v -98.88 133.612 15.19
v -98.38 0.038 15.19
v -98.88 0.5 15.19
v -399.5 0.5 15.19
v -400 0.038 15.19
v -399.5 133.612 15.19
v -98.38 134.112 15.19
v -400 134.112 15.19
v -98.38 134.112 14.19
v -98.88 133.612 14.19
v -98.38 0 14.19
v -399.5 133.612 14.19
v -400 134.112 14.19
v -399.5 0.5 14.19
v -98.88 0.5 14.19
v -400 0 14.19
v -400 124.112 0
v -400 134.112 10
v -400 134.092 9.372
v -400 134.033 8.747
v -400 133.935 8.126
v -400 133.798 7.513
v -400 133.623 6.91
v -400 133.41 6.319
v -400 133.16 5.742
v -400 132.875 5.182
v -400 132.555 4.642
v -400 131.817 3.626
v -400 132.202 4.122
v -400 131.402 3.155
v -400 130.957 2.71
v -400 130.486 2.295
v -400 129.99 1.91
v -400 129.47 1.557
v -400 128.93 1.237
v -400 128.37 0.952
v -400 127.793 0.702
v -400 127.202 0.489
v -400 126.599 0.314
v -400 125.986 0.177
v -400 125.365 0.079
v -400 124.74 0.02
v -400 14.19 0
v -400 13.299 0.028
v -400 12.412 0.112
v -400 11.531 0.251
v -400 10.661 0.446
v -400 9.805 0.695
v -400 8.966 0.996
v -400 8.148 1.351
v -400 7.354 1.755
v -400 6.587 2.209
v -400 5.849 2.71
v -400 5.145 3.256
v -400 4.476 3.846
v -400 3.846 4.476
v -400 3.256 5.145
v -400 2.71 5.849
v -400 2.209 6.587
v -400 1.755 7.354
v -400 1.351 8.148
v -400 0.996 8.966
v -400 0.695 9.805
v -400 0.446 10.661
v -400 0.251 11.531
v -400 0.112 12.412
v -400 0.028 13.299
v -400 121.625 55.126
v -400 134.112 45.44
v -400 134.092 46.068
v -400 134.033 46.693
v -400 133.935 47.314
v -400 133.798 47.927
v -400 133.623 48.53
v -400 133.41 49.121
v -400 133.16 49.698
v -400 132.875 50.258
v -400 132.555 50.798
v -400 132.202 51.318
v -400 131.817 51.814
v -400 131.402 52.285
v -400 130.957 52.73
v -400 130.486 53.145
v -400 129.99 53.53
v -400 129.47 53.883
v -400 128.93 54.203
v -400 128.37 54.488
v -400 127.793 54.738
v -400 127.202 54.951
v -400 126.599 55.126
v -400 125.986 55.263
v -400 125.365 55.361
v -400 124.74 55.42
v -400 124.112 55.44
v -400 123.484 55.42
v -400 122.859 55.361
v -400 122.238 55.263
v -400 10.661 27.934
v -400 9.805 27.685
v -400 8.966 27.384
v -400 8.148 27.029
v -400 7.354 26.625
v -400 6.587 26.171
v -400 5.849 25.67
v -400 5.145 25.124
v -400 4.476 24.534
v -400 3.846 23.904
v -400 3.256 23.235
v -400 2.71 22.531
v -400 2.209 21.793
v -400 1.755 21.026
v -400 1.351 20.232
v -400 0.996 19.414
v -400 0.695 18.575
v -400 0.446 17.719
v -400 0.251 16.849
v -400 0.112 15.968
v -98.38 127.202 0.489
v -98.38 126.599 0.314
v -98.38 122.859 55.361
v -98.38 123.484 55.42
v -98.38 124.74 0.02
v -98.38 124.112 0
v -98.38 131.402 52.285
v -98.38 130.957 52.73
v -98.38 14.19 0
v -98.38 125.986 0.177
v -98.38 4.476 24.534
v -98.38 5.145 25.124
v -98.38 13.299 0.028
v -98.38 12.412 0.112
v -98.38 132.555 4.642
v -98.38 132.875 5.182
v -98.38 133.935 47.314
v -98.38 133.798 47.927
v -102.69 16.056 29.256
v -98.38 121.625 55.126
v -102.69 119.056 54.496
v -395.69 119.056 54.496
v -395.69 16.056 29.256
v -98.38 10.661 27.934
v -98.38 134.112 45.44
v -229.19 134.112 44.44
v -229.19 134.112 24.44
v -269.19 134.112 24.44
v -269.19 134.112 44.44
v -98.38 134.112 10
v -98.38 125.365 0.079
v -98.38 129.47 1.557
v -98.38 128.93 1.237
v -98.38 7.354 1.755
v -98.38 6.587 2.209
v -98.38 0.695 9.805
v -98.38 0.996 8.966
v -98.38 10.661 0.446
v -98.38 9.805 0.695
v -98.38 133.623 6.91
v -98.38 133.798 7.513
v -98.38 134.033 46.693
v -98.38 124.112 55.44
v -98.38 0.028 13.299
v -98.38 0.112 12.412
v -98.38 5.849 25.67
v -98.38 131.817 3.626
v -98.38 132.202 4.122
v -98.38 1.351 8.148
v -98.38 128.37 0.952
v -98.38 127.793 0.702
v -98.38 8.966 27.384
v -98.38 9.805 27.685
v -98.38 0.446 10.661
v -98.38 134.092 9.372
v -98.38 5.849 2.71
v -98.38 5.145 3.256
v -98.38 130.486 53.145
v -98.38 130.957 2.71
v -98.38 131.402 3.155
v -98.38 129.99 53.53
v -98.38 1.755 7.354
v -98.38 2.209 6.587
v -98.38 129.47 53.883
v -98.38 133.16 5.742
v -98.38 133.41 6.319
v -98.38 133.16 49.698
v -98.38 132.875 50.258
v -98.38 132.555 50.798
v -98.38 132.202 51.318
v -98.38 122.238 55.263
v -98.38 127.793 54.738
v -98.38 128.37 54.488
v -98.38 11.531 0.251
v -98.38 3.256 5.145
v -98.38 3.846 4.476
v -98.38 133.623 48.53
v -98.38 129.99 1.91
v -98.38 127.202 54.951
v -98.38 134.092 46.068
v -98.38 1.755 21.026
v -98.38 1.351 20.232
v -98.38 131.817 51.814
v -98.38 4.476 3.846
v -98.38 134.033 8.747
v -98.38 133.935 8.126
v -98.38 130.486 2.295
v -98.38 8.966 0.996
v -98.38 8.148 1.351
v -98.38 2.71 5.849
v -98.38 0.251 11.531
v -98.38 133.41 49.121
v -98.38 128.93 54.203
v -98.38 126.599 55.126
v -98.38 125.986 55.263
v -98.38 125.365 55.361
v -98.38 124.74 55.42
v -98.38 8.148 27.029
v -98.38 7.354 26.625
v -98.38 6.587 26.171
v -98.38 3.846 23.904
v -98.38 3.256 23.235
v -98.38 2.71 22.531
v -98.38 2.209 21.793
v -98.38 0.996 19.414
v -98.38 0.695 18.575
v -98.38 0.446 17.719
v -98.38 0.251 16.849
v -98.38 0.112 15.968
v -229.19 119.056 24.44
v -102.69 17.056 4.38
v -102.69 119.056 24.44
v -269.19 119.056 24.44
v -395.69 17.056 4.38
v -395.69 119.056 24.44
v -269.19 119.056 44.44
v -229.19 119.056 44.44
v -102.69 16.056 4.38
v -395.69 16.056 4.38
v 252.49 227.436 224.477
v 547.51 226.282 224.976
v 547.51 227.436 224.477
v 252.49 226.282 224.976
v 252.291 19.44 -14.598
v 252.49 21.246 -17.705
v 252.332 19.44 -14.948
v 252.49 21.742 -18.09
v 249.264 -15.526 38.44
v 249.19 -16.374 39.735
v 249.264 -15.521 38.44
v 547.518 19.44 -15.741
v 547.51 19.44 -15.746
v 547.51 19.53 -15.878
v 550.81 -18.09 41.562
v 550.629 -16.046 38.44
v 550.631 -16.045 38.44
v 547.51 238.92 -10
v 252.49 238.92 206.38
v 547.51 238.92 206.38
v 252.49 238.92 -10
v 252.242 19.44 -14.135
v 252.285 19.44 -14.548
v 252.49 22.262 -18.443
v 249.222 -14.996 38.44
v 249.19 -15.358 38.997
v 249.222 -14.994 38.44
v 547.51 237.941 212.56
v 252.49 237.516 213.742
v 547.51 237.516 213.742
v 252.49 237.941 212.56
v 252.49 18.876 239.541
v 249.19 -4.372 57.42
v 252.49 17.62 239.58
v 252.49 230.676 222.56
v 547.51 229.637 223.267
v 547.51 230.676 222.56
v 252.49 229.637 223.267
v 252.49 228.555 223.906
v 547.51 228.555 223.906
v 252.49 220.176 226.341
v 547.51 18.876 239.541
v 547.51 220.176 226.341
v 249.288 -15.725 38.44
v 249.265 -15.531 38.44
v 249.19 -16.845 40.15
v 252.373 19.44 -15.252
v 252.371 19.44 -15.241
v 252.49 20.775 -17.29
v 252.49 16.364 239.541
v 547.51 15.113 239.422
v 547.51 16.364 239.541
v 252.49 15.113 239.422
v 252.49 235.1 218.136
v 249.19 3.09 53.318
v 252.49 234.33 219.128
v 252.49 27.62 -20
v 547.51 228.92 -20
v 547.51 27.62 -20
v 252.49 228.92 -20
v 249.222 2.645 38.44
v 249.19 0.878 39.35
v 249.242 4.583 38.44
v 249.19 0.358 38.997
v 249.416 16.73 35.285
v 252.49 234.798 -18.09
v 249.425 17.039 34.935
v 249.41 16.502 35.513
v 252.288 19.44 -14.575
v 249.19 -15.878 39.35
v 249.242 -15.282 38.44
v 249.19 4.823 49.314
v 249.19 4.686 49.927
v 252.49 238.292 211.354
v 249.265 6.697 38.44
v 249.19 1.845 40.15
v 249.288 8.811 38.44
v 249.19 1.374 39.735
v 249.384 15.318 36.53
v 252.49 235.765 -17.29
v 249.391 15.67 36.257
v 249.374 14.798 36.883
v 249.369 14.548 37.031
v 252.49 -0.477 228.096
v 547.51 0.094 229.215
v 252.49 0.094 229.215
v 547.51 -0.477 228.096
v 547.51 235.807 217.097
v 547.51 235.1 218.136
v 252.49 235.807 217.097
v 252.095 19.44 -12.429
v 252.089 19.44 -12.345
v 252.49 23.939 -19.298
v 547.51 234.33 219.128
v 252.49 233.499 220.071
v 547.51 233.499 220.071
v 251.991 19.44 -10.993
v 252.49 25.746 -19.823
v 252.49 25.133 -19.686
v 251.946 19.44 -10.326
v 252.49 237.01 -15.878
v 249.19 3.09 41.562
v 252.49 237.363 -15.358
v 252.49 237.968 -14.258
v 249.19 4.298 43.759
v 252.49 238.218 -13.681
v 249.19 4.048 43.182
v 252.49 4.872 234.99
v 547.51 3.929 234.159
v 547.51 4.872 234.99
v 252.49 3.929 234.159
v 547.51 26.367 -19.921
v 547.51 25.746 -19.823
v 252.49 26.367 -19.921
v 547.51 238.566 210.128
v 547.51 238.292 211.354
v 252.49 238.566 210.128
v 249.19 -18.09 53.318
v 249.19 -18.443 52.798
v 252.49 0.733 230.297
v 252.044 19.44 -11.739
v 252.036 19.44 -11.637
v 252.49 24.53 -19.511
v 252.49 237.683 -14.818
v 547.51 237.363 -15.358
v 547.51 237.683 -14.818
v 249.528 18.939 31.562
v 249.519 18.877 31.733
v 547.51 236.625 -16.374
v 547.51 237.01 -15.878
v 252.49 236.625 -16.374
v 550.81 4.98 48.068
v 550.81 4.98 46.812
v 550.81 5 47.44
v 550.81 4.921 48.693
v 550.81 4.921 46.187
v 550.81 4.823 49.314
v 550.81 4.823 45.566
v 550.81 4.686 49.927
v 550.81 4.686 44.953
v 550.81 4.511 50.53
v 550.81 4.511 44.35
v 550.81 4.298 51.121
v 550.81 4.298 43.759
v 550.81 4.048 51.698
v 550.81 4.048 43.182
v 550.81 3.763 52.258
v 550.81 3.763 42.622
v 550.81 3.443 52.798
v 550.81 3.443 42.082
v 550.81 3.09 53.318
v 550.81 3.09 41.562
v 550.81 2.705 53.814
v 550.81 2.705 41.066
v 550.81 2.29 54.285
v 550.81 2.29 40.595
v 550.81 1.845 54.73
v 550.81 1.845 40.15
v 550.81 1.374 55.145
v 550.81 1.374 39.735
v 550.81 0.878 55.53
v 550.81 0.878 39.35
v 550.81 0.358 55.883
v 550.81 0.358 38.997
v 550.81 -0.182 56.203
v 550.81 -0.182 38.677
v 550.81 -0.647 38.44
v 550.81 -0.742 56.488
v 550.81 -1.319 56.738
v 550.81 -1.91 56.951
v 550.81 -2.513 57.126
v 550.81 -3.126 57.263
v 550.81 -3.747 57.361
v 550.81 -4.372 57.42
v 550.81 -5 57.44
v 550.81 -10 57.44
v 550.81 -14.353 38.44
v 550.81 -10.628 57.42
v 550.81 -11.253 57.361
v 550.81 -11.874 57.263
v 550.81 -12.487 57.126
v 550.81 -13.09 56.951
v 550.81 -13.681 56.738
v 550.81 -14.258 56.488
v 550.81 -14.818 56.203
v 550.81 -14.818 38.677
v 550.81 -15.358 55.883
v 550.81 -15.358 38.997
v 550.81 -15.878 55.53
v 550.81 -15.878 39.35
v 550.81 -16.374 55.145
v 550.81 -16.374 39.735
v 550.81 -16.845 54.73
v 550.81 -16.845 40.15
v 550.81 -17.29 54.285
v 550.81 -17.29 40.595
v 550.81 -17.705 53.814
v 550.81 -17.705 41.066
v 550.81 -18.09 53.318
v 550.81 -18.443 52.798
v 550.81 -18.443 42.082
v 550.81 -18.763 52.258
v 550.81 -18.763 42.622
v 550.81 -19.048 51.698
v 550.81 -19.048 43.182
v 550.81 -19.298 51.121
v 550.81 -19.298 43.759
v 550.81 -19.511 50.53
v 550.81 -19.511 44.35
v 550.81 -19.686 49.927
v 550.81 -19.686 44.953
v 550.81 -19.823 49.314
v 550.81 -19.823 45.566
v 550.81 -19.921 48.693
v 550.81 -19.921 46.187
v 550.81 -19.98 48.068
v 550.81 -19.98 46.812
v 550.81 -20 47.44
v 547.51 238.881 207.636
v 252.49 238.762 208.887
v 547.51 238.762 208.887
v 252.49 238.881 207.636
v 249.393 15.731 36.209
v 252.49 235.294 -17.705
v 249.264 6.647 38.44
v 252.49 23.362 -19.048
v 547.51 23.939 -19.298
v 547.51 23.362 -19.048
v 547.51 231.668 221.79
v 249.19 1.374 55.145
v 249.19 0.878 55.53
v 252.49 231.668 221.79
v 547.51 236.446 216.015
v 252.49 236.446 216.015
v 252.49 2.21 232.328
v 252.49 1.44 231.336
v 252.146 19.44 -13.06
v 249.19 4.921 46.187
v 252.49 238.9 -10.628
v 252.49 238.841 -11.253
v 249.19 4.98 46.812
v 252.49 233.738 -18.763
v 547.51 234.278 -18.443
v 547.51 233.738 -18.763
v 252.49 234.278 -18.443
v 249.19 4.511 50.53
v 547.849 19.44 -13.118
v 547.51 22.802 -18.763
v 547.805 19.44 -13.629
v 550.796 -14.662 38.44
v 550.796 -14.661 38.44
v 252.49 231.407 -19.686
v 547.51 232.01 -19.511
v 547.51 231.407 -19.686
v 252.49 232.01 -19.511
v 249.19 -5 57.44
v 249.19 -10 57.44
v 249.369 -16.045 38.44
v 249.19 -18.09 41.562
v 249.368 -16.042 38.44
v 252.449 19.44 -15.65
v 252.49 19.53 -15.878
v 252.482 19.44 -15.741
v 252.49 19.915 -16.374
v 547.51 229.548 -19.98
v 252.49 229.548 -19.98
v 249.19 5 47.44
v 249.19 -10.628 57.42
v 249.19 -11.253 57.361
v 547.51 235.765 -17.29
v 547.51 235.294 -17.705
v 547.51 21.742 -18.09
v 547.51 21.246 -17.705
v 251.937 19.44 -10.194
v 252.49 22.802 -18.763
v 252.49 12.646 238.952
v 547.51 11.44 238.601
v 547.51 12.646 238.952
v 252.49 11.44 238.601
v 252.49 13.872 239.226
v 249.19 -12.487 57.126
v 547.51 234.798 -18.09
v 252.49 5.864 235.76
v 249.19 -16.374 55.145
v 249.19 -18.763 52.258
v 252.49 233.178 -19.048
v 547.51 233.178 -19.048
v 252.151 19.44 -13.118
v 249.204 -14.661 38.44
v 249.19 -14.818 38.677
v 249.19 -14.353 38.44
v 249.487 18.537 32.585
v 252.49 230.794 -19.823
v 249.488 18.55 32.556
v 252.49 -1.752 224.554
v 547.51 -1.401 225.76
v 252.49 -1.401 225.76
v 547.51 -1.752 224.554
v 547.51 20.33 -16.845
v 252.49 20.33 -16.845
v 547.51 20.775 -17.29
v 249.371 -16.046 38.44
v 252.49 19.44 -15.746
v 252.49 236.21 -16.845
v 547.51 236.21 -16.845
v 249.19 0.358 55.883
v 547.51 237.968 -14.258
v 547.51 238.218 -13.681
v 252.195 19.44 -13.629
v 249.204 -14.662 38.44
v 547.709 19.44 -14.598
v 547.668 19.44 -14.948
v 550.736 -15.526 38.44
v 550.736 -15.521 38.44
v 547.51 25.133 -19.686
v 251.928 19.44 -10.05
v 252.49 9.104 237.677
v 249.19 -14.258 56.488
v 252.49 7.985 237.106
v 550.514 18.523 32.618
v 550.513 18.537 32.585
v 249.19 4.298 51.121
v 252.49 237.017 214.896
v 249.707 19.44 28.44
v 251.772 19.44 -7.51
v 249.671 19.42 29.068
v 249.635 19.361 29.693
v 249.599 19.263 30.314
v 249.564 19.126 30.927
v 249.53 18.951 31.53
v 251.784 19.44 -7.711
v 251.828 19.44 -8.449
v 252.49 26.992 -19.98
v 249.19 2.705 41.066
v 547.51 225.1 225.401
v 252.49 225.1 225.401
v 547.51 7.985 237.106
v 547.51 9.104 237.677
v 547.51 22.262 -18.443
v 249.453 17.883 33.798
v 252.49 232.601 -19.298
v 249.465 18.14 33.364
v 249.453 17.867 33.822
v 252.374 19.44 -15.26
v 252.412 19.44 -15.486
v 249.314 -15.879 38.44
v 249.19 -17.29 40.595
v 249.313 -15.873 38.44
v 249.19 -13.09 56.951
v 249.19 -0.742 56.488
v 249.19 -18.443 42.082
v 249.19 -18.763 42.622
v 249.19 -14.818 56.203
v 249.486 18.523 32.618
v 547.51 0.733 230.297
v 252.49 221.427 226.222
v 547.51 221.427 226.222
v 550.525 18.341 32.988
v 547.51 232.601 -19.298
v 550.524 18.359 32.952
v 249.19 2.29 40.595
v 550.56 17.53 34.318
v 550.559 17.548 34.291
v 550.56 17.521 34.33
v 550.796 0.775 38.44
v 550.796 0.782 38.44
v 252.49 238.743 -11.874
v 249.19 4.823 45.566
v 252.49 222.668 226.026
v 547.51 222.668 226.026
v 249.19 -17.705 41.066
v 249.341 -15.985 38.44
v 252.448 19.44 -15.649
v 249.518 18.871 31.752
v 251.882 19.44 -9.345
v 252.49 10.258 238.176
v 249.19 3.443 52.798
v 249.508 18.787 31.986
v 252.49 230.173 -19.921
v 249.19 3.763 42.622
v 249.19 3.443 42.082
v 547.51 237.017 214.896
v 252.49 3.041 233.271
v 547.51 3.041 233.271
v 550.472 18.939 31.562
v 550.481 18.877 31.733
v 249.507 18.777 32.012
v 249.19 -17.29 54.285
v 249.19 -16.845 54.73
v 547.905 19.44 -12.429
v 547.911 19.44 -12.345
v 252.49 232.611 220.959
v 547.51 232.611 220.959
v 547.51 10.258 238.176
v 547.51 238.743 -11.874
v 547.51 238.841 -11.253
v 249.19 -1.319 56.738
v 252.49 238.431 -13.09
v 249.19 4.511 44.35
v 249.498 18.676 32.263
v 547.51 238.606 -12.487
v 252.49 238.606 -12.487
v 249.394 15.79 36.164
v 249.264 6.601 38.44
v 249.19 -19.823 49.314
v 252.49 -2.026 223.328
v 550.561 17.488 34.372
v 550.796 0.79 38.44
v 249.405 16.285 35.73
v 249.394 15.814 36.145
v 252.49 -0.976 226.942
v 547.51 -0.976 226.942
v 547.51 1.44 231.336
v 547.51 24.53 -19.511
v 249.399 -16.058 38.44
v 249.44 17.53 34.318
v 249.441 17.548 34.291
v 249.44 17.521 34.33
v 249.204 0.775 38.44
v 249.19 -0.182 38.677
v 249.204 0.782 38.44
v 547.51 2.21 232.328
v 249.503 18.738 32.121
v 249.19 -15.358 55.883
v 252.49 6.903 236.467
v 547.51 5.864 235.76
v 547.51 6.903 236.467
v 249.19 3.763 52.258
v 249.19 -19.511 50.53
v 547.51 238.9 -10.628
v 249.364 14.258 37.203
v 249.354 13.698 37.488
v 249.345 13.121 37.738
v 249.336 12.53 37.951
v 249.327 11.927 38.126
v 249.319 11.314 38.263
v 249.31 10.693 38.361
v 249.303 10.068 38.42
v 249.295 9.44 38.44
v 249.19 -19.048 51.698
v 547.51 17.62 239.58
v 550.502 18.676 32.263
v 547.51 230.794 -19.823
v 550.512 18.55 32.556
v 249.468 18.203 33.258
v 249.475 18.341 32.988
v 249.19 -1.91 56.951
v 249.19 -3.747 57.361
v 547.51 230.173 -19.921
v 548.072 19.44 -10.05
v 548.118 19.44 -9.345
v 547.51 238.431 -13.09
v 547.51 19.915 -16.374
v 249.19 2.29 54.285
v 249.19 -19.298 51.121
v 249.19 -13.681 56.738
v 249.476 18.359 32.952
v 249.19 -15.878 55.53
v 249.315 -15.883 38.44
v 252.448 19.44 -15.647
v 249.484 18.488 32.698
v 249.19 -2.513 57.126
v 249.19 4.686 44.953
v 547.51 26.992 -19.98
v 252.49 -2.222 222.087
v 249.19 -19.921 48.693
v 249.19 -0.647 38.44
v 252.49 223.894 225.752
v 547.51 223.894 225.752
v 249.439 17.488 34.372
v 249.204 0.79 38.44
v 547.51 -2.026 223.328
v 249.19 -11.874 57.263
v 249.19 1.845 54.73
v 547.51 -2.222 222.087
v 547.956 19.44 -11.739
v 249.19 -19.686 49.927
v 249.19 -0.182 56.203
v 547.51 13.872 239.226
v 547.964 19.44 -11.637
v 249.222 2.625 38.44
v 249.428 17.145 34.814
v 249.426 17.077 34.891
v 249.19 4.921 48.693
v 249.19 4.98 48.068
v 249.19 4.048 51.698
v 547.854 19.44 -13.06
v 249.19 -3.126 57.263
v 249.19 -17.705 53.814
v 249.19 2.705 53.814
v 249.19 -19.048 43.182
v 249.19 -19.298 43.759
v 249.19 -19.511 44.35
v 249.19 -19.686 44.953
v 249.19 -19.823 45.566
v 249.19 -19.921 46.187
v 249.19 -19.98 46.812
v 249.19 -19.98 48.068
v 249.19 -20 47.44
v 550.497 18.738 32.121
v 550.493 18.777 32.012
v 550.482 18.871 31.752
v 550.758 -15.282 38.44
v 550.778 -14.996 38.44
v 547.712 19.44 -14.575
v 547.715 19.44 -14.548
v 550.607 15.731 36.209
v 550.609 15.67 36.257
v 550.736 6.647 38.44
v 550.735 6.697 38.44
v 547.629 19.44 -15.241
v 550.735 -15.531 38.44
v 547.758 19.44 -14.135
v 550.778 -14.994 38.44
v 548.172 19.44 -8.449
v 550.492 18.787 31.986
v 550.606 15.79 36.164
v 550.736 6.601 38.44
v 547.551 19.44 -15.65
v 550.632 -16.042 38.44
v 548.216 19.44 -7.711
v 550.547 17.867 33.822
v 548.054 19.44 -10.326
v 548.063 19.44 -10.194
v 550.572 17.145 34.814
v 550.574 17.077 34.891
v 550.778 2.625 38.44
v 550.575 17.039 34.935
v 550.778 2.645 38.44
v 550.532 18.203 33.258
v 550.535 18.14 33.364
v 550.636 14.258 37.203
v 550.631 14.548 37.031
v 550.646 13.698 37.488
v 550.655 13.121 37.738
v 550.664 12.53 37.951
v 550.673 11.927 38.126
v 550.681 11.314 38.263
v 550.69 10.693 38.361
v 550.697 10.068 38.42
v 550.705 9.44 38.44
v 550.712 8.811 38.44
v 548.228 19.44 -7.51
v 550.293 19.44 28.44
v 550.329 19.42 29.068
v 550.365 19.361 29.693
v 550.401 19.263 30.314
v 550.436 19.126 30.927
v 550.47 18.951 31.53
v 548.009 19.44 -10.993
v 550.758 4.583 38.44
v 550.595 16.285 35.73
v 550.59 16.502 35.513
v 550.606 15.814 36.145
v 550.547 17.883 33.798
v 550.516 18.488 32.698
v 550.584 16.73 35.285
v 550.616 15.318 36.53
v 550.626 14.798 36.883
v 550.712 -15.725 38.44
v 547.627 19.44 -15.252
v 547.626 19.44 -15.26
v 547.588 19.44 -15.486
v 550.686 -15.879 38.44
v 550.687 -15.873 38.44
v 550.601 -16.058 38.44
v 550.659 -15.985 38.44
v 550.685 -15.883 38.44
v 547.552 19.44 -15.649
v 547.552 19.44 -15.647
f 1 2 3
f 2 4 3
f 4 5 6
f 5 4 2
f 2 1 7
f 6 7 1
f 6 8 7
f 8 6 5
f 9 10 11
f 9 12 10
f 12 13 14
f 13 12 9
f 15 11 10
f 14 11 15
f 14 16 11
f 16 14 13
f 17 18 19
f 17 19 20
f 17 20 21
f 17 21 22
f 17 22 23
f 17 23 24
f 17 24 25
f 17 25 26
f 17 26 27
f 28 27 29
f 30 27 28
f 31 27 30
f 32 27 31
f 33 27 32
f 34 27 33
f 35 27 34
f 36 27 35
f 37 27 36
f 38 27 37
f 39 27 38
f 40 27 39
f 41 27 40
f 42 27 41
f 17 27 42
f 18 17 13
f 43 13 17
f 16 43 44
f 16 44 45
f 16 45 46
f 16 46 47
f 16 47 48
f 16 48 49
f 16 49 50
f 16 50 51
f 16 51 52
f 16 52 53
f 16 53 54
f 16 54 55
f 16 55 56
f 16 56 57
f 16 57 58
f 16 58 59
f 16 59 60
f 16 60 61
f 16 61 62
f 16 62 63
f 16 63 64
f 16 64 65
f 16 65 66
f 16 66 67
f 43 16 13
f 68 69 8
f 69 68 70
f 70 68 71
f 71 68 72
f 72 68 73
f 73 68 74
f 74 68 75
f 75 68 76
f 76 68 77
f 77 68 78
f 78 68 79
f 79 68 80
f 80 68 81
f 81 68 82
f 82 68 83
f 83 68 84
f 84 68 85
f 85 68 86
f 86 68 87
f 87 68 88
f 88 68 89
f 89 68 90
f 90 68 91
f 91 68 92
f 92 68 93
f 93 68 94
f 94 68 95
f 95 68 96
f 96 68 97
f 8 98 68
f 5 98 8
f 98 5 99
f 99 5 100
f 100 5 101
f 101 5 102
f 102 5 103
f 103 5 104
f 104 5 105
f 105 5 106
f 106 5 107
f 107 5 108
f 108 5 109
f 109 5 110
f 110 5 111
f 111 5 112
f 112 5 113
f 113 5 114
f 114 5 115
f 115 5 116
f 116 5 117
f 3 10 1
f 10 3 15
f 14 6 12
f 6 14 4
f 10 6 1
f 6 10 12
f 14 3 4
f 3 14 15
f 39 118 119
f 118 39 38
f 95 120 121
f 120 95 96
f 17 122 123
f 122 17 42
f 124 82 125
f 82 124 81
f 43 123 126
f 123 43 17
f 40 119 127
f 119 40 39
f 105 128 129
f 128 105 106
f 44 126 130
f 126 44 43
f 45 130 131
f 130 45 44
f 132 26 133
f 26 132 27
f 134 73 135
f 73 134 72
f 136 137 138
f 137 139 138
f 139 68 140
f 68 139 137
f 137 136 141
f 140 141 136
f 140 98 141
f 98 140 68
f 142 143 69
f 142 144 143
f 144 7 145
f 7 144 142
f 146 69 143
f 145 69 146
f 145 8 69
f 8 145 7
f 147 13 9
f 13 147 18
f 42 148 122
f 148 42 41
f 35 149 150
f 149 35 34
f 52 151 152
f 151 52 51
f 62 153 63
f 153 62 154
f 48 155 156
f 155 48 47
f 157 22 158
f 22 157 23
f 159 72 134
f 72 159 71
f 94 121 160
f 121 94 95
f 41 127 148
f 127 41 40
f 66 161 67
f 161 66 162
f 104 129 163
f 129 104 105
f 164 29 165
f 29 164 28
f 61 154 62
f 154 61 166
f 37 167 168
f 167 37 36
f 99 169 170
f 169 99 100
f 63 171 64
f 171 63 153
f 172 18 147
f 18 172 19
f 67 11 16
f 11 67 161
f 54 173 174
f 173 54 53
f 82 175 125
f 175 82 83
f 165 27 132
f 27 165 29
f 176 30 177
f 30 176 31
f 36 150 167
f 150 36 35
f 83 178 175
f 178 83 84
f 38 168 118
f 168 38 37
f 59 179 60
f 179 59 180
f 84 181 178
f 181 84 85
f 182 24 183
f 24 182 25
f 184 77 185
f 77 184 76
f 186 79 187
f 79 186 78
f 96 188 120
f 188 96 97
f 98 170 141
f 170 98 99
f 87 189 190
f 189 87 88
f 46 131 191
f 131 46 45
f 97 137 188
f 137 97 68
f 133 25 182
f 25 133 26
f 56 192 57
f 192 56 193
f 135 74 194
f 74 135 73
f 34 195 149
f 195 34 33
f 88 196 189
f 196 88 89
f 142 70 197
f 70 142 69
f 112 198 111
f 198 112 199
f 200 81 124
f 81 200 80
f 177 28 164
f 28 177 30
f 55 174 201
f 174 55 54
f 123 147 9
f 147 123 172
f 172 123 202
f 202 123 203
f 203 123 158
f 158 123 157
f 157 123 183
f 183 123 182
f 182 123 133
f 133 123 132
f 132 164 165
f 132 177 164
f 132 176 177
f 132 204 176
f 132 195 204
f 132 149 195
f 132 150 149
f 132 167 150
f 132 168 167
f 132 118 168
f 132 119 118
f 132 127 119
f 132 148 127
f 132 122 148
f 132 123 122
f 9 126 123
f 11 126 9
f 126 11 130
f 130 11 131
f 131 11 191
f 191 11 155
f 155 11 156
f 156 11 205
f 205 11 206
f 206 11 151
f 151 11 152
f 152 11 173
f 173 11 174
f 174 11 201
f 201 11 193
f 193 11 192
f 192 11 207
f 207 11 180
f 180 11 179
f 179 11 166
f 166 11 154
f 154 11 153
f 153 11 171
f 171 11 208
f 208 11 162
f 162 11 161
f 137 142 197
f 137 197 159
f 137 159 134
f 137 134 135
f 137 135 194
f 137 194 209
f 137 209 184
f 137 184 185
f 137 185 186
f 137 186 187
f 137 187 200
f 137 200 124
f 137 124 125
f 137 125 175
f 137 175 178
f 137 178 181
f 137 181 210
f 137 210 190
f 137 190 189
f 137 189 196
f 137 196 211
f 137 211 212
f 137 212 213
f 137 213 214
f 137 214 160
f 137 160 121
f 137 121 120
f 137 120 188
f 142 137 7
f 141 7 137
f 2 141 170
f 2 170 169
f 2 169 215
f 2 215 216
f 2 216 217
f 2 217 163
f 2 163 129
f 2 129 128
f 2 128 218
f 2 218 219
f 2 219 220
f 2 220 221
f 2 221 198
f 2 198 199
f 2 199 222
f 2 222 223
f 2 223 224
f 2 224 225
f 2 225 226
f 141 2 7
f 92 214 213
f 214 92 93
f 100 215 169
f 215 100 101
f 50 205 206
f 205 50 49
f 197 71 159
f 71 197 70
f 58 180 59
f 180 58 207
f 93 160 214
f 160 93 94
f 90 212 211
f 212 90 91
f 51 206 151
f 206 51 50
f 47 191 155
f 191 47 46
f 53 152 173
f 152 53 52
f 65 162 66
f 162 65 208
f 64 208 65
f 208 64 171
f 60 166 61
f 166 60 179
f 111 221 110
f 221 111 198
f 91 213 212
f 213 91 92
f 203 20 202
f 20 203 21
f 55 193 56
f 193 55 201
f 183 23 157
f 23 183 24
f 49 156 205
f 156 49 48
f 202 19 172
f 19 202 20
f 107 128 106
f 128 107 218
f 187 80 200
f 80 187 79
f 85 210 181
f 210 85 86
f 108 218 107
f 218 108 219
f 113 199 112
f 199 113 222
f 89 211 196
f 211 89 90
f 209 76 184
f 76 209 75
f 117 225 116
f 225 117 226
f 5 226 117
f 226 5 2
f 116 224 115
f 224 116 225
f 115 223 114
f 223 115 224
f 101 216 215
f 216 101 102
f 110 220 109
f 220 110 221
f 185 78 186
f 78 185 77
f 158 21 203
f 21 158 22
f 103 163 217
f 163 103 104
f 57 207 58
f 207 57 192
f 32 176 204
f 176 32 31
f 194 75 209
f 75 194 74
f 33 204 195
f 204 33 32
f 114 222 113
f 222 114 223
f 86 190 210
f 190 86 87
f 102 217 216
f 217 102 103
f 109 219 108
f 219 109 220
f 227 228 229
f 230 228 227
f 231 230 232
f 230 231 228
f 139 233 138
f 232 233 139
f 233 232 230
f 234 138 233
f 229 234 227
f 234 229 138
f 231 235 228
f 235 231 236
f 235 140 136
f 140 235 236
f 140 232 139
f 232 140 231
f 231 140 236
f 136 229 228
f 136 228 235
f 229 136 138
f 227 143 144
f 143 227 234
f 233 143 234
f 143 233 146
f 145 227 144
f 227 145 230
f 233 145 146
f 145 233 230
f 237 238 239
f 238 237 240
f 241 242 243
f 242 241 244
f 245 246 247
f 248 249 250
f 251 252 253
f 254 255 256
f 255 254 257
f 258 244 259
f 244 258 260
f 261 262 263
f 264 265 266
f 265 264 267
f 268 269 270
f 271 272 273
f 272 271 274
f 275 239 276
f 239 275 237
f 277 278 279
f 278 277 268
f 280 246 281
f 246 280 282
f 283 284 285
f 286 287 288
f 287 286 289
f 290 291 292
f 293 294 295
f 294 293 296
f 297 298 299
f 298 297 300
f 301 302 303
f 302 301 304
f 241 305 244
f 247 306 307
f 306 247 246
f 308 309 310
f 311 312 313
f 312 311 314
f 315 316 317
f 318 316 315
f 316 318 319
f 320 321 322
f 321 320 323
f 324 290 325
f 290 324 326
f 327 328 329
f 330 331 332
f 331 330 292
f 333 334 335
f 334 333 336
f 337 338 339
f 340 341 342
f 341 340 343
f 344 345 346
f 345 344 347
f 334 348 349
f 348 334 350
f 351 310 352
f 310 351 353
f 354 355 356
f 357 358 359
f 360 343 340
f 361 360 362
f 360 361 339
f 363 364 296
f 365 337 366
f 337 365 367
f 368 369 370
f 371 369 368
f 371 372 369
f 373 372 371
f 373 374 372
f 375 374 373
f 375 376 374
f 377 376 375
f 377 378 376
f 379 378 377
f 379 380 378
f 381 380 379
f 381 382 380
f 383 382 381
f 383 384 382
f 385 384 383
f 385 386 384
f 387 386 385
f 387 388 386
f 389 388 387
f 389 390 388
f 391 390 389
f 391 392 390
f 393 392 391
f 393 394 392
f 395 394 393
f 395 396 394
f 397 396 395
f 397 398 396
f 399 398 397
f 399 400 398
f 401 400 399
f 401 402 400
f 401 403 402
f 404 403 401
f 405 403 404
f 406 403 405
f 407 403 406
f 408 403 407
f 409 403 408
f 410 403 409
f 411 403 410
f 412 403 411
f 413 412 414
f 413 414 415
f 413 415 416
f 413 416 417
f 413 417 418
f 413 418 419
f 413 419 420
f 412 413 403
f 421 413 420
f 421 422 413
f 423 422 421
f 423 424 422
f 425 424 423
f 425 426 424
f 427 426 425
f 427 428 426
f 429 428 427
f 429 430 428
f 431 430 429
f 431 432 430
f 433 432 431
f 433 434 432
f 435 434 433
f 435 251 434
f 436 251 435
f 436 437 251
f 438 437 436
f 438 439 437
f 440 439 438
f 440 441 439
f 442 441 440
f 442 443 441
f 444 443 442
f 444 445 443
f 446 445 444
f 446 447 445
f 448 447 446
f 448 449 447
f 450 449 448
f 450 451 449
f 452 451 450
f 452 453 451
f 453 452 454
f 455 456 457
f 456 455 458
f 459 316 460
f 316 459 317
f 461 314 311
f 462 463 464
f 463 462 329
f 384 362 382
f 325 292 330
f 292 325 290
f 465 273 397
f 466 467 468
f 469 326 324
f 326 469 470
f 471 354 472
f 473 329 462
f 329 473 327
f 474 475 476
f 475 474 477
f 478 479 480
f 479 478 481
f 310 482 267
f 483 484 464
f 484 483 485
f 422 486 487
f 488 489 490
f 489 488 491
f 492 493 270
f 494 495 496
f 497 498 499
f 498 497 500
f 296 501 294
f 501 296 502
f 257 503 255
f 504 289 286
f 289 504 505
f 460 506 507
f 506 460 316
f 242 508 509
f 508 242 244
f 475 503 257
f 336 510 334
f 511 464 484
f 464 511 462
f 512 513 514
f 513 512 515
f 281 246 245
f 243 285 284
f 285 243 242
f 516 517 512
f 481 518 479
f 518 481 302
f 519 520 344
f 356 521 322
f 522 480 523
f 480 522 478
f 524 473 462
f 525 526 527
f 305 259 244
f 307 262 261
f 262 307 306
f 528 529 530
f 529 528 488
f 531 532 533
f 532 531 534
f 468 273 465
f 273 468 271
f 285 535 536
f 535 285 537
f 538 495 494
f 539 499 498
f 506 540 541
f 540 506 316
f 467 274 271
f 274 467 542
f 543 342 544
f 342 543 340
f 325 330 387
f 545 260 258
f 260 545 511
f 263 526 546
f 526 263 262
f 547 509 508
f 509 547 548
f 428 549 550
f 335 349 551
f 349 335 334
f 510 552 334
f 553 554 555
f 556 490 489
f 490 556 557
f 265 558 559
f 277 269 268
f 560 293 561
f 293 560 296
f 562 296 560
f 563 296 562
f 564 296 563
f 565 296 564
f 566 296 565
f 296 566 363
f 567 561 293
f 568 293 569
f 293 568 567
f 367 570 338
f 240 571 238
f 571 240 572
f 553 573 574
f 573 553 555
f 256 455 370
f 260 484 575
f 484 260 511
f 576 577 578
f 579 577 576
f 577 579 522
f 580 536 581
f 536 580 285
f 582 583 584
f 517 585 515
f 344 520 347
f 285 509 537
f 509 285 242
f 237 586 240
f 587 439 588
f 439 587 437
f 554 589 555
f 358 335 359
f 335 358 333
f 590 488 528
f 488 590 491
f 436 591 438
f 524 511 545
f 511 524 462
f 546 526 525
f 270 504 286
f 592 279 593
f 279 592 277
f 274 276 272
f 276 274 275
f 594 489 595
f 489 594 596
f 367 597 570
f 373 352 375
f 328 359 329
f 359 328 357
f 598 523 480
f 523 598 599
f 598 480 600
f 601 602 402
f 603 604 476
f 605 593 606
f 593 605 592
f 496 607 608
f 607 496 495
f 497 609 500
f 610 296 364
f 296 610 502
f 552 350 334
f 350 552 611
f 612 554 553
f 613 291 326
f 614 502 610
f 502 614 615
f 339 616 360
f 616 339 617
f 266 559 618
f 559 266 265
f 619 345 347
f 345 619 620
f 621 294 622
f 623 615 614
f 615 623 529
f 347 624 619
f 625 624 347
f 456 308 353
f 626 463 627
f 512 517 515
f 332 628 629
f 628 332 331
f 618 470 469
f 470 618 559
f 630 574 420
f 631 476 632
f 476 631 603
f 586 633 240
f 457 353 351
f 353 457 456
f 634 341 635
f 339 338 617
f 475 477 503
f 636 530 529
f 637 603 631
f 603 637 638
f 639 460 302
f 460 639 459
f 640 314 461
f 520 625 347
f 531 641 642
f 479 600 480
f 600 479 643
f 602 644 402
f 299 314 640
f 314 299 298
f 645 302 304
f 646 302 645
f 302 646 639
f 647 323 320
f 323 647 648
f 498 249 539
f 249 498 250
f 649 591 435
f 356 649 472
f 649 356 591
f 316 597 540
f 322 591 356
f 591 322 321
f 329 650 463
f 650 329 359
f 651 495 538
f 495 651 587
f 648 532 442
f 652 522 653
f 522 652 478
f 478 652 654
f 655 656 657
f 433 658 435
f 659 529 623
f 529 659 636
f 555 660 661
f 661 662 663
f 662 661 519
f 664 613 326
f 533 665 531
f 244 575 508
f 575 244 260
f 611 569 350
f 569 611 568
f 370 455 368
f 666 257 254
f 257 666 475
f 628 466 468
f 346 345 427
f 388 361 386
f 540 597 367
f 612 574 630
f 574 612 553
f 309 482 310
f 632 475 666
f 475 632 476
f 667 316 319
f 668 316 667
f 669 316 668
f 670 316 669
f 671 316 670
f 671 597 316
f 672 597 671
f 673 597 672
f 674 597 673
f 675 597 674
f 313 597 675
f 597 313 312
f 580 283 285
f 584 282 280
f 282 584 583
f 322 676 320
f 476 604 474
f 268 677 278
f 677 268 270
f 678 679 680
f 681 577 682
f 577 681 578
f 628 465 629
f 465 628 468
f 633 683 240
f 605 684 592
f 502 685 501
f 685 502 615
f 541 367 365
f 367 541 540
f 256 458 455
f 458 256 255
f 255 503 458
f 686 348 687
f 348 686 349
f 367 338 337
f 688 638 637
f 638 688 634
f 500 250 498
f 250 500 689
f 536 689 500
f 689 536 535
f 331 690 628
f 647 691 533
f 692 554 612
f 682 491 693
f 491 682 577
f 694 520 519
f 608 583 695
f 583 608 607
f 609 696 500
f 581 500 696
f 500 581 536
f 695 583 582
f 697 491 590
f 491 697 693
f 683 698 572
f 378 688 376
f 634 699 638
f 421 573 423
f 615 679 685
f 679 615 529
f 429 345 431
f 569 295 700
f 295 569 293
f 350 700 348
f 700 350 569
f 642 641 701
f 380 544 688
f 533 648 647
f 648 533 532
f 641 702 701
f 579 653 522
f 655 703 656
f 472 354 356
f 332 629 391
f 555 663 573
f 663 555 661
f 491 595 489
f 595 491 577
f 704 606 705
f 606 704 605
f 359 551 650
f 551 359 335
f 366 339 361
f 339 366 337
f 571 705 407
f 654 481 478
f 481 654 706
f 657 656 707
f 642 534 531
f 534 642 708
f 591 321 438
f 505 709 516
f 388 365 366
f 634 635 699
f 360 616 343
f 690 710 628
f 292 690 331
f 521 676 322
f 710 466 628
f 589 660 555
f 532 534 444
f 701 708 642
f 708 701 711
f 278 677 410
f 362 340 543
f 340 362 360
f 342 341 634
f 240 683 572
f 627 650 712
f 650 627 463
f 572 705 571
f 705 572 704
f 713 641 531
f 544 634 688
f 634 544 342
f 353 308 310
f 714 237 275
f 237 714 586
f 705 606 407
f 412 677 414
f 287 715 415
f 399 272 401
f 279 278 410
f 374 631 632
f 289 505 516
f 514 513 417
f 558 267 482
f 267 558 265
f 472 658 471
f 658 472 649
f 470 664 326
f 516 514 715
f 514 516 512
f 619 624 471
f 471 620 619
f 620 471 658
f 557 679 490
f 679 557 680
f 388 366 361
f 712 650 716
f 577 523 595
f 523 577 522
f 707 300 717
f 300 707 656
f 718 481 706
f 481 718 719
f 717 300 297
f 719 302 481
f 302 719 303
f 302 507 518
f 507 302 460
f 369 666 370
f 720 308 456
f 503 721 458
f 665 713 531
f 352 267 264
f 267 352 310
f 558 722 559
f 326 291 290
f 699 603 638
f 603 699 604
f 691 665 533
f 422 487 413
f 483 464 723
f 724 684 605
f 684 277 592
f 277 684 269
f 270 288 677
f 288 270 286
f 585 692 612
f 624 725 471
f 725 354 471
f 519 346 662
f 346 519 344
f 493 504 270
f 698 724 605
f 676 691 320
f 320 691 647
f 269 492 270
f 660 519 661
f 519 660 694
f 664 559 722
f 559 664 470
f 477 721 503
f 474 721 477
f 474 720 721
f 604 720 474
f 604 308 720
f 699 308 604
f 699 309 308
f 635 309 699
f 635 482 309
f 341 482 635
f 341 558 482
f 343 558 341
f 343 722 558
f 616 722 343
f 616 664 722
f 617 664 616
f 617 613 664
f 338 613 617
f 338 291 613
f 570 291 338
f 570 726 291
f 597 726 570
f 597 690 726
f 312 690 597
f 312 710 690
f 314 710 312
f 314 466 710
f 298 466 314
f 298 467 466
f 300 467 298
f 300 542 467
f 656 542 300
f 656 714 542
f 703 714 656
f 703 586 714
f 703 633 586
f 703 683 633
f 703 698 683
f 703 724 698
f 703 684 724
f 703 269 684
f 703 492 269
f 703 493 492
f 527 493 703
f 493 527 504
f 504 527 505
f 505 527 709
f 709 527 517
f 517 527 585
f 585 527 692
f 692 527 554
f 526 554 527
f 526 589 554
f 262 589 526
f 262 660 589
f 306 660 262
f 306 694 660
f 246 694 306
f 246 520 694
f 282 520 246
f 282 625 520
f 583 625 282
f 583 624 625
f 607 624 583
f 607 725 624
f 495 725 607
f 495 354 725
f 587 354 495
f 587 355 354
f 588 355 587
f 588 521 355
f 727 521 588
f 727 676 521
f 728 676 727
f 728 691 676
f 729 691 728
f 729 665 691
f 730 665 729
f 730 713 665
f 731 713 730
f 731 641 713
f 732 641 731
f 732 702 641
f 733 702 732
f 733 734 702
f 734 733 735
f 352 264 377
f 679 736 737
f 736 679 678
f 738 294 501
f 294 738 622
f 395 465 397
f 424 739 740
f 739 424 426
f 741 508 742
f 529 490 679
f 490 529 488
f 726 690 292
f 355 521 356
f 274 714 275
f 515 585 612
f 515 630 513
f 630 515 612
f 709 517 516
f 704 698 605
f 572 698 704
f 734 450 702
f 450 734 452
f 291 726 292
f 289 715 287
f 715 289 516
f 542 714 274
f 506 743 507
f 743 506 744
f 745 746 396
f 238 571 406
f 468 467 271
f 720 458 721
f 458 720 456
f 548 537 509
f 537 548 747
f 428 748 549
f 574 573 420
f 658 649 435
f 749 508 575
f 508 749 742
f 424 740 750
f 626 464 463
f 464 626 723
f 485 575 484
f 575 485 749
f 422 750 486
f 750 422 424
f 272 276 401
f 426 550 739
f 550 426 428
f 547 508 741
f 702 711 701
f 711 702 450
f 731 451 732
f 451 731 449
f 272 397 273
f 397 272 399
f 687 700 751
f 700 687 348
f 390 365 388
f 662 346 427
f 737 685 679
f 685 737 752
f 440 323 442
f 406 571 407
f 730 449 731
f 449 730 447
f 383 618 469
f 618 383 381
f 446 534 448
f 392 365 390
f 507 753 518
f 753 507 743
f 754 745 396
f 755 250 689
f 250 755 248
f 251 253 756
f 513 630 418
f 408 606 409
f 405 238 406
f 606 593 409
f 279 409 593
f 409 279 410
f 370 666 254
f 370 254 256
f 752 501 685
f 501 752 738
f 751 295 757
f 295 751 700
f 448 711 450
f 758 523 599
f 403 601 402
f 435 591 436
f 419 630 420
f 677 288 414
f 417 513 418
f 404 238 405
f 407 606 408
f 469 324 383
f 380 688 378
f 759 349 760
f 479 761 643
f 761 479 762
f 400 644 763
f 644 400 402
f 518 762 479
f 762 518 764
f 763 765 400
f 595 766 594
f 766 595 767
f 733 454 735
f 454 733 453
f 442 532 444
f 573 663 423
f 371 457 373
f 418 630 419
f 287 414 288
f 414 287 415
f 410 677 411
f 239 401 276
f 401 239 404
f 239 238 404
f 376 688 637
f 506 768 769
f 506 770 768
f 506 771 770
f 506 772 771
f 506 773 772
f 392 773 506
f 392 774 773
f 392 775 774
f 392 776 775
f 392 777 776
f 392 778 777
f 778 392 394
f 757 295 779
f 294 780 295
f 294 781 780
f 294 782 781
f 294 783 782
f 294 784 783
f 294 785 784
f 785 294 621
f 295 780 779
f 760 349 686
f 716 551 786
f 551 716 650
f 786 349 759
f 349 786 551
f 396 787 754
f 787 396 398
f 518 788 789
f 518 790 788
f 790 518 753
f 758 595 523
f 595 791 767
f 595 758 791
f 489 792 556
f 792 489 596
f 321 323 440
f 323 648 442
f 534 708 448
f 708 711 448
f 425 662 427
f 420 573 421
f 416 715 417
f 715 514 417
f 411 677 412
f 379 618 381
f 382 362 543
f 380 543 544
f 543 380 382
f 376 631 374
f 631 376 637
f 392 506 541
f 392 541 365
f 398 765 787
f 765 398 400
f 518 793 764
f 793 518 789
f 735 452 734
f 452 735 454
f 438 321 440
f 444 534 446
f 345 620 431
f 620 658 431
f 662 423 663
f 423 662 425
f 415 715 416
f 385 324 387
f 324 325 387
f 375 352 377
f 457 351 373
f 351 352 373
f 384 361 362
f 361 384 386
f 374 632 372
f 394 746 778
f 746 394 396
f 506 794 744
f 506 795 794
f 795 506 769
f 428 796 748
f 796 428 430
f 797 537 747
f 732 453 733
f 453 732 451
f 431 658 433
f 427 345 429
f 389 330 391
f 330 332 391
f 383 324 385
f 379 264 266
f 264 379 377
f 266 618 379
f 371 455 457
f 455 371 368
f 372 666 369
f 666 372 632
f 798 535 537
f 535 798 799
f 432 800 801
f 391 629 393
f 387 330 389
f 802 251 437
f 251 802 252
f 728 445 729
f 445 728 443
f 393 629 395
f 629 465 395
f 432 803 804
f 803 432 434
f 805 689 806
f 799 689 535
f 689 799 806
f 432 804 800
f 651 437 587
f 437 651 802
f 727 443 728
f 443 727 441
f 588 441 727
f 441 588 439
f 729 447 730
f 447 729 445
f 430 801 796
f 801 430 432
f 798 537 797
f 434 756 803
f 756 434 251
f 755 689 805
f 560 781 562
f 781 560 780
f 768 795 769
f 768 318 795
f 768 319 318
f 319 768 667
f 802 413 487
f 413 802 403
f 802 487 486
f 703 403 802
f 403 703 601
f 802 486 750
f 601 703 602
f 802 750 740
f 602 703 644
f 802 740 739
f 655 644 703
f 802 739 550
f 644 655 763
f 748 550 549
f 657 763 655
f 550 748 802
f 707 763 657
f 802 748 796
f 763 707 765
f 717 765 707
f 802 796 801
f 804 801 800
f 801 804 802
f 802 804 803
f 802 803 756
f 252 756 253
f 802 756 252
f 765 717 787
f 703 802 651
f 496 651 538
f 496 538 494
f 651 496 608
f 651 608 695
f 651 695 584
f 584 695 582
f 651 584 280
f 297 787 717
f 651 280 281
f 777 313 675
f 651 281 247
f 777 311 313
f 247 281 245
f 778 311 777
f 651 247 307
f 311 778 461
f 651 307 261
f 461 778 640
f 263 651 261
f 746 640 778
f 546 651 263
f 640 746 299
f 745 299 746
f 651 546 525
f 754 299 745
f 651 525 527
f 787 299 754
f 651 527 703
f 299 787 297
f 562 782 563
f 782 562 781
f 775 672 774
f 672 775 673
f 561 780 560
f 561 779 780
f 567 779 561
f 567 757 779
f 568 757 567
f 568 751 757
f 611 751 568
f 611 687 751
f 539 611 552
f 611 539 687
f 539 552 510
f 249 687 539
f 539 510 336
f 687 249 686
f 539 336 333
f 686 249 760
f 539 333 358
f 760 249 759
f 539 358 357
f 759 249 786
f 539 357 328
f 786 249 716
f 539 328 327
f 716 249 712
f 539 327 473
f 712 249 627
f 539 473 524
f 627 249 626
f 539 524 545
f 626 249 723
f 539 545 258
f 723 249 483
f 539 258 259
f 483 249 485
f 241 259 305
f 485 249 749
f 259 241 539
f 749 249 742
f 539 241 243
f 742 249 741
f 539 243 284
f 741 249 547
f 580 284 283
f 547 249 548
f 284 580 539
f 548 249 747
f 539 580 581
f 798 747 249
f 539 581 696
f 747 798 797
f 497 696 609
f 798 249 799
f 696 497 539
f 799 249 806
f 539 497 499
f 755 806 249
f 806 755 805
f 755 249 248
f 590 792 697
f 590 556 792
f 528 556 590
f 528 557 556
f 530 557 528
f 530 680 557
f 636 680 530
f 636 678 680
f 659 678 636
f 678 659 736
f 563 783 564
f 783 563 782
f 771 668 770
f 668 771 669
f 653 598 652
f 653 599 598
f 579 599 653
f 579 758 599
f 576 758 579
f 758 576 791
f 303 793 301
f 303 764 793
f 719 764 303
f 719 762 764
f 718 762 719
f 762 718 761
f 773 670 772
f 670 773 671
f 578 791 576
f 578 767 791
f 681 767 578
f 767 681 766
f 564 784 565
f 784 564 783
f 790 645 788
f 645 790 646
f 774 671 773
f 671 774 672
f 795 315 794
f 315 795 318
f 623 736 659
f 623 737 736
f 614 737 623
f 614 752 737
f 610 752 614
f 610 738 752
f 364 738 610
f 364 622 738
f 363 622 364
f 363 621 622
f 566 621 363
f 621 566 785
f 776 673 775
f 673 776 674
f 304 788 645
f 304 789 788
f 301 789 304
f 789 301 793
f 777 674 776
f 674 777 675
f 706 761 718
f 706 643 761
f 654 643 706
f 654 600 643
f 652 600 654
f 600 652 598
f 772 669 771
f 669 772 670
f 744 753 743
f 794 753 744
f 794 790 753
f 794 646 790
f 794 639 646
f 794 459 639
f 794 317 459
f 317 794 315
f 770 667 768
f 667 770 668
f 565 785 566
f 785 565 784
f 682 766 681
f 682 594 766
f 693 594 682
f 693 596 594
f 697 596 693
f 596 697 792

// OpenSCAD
// VT100 Terminal Replica 66% Tastatur

$fn = 100;     // Fix 100 Facetten pro Kreis (langsam bei großen Objekten)
$fa = 1;       // Minimaler Winkel 1° pro Facette (empfohlen)
$fs = 0.2;     // Minimale Facettengröße 0.2mm (3D-Druck-optimiert)


// Masse der Tastatur Replika
function scale(x) = 0.66 * x;
fuss = 5;

kb_x = scale(457);      //302;         // Breite
kb_y = scale(203.2);    //134;         // Tiefe
kb_z_vorn = scale(48 - fuss);  // 30          //Hoehe vorne
kb_z_hinten = scale(89 - fuss);// 50;         // Hoehe hinten

echo("kb_x =", kb_x);
echo("kb_y =", kb_y);
echo("kb_z_vorn =", kb_z_vorn);
echo("kb_z_hinten =", kb_z_hinten);

// Aussenmasse der Tastatur
t_x = 293;          // Breite;
t_y = 102;          // Tiefe
t_z_vorn = 24;      // Hoehe vorn
t_z_hinten = 31;    // Hoehe hinten


// Masse des Gehaeses

g_x = scale(457);
g_x_unten = scale(457 - 10);
g_x_oben = scale(457 - 10);
g_y = scale(362);
g_y_oben = scale(57);
g_z_vorn = scale(368 - fuss);
g_z_hinten = scale(368 - fuss - 20);
g_dz_vorn = kb_z_hinten + 2;
g_dy_vorn = scale(57);





// VT100 Tastatur Gehäuse


module ausschnitt(){
  dx = (kb_x - t_x)/2;
  dy = (kb_y - t_y)/2;
  dz_vorn = kb_z_vorn - t_z_vorn;
  dz_hinten = kb_z_hinten - t_z_hinten; 

  color("red")
    hull(){
        translate([dx, dy, dz_vorn])
            cube([t_x, 1, t_z_vorn + 10]);
        translate([dx, kb_y - dy, dz_hinten])
            cube([t_x, 1, t_z_hinten + 10]);
    }

}

module usb_stecker(){
    color("green")
        translate([kb_x/2, kb_y -10, kb_z_hinten - t_z_hinten + 10])
            cube([40, 25, 20], center = true);
}

module nut(d){
    color("Blue")
        translate([0,0, kb_z_vorn/2])
        difference(){
            cube([kb_x + d, kb_y + d, d]);
            translate([d/2, d/2, 0])
            cube([kb_x - d, kb_y - d , d]);
    }
}

module tastatur(breite, tiefe, hoehe_vorne, hoehe_hinten) {
    r_vorn = hoehe_vorne/2;
    r_hinten = 10;

   hull() {
    // Vorne
    translate([0, r_vorn, r_vorn])
            rotate([0,90,0])
                cylinder(h=breite, r=r_vorn, center= false);

    union(){
        translate([0, tiefe-r_hinten, r_hinten])
            rotate([0,90,0])
                cylinder(h=breite, r=r_hinten, center= false);
        translate([0, tiefe-r_hinten, hoehe_hinten-r_hinten])
            rotate([0,90,0])
                cylinder(h=breite, r=r_hinten, center= false);
        }
    }
}



// VT100 Tastatur Gehäuse in 66%
// tastatur(302, 134, 32, 59);

render() // wird sonst nicht korrekt angezeigt in preview
{
translate([-400,0,0])

    difference()
    {
    tastatur(kb_x, kb_y, kb_z_vorn, kb_z_hinten);
    ausschnitt();
    usb_stecker();
    nut(1);
    }
}


// VT100 Gehäuse in 66%

module roll(r, b, y, z){
    translate([0, y-r, z-r])
            rotate([0,90,0])
                cylinder(h=b, r=r, center= true);
}

module gehaeuse(){

difference(){  
  hull(){
        roll(10, g_x_unten, g_dy_vorn, 0);
        roll(10, g_x_unten, g_y, 0);
        roll(20, g_x_oben, g_y, g_z_hinten);
        roll(20, g_x_oben, g_y_oben, g_z_vorn);
        roll(10, g_x, 0, g_dz_vorn);
        roll(10, g_x, 5, g_dz_vorn); // muss abgezogen werden
    }
    translate([0, -38, -20]){
    color("Red") hull(){
        roll(10, g_x, 0, 0);
        roll(10, g_x, g_dz_vorn, 0);
        roll(10, g_x, g_dz_vorn, g_dz_vorn+1);
        roll(10, g_x, 0, g_dz_vorn+1);
    }
    }
    }
}

render() translate([400,0,0]) gehaeuse();
